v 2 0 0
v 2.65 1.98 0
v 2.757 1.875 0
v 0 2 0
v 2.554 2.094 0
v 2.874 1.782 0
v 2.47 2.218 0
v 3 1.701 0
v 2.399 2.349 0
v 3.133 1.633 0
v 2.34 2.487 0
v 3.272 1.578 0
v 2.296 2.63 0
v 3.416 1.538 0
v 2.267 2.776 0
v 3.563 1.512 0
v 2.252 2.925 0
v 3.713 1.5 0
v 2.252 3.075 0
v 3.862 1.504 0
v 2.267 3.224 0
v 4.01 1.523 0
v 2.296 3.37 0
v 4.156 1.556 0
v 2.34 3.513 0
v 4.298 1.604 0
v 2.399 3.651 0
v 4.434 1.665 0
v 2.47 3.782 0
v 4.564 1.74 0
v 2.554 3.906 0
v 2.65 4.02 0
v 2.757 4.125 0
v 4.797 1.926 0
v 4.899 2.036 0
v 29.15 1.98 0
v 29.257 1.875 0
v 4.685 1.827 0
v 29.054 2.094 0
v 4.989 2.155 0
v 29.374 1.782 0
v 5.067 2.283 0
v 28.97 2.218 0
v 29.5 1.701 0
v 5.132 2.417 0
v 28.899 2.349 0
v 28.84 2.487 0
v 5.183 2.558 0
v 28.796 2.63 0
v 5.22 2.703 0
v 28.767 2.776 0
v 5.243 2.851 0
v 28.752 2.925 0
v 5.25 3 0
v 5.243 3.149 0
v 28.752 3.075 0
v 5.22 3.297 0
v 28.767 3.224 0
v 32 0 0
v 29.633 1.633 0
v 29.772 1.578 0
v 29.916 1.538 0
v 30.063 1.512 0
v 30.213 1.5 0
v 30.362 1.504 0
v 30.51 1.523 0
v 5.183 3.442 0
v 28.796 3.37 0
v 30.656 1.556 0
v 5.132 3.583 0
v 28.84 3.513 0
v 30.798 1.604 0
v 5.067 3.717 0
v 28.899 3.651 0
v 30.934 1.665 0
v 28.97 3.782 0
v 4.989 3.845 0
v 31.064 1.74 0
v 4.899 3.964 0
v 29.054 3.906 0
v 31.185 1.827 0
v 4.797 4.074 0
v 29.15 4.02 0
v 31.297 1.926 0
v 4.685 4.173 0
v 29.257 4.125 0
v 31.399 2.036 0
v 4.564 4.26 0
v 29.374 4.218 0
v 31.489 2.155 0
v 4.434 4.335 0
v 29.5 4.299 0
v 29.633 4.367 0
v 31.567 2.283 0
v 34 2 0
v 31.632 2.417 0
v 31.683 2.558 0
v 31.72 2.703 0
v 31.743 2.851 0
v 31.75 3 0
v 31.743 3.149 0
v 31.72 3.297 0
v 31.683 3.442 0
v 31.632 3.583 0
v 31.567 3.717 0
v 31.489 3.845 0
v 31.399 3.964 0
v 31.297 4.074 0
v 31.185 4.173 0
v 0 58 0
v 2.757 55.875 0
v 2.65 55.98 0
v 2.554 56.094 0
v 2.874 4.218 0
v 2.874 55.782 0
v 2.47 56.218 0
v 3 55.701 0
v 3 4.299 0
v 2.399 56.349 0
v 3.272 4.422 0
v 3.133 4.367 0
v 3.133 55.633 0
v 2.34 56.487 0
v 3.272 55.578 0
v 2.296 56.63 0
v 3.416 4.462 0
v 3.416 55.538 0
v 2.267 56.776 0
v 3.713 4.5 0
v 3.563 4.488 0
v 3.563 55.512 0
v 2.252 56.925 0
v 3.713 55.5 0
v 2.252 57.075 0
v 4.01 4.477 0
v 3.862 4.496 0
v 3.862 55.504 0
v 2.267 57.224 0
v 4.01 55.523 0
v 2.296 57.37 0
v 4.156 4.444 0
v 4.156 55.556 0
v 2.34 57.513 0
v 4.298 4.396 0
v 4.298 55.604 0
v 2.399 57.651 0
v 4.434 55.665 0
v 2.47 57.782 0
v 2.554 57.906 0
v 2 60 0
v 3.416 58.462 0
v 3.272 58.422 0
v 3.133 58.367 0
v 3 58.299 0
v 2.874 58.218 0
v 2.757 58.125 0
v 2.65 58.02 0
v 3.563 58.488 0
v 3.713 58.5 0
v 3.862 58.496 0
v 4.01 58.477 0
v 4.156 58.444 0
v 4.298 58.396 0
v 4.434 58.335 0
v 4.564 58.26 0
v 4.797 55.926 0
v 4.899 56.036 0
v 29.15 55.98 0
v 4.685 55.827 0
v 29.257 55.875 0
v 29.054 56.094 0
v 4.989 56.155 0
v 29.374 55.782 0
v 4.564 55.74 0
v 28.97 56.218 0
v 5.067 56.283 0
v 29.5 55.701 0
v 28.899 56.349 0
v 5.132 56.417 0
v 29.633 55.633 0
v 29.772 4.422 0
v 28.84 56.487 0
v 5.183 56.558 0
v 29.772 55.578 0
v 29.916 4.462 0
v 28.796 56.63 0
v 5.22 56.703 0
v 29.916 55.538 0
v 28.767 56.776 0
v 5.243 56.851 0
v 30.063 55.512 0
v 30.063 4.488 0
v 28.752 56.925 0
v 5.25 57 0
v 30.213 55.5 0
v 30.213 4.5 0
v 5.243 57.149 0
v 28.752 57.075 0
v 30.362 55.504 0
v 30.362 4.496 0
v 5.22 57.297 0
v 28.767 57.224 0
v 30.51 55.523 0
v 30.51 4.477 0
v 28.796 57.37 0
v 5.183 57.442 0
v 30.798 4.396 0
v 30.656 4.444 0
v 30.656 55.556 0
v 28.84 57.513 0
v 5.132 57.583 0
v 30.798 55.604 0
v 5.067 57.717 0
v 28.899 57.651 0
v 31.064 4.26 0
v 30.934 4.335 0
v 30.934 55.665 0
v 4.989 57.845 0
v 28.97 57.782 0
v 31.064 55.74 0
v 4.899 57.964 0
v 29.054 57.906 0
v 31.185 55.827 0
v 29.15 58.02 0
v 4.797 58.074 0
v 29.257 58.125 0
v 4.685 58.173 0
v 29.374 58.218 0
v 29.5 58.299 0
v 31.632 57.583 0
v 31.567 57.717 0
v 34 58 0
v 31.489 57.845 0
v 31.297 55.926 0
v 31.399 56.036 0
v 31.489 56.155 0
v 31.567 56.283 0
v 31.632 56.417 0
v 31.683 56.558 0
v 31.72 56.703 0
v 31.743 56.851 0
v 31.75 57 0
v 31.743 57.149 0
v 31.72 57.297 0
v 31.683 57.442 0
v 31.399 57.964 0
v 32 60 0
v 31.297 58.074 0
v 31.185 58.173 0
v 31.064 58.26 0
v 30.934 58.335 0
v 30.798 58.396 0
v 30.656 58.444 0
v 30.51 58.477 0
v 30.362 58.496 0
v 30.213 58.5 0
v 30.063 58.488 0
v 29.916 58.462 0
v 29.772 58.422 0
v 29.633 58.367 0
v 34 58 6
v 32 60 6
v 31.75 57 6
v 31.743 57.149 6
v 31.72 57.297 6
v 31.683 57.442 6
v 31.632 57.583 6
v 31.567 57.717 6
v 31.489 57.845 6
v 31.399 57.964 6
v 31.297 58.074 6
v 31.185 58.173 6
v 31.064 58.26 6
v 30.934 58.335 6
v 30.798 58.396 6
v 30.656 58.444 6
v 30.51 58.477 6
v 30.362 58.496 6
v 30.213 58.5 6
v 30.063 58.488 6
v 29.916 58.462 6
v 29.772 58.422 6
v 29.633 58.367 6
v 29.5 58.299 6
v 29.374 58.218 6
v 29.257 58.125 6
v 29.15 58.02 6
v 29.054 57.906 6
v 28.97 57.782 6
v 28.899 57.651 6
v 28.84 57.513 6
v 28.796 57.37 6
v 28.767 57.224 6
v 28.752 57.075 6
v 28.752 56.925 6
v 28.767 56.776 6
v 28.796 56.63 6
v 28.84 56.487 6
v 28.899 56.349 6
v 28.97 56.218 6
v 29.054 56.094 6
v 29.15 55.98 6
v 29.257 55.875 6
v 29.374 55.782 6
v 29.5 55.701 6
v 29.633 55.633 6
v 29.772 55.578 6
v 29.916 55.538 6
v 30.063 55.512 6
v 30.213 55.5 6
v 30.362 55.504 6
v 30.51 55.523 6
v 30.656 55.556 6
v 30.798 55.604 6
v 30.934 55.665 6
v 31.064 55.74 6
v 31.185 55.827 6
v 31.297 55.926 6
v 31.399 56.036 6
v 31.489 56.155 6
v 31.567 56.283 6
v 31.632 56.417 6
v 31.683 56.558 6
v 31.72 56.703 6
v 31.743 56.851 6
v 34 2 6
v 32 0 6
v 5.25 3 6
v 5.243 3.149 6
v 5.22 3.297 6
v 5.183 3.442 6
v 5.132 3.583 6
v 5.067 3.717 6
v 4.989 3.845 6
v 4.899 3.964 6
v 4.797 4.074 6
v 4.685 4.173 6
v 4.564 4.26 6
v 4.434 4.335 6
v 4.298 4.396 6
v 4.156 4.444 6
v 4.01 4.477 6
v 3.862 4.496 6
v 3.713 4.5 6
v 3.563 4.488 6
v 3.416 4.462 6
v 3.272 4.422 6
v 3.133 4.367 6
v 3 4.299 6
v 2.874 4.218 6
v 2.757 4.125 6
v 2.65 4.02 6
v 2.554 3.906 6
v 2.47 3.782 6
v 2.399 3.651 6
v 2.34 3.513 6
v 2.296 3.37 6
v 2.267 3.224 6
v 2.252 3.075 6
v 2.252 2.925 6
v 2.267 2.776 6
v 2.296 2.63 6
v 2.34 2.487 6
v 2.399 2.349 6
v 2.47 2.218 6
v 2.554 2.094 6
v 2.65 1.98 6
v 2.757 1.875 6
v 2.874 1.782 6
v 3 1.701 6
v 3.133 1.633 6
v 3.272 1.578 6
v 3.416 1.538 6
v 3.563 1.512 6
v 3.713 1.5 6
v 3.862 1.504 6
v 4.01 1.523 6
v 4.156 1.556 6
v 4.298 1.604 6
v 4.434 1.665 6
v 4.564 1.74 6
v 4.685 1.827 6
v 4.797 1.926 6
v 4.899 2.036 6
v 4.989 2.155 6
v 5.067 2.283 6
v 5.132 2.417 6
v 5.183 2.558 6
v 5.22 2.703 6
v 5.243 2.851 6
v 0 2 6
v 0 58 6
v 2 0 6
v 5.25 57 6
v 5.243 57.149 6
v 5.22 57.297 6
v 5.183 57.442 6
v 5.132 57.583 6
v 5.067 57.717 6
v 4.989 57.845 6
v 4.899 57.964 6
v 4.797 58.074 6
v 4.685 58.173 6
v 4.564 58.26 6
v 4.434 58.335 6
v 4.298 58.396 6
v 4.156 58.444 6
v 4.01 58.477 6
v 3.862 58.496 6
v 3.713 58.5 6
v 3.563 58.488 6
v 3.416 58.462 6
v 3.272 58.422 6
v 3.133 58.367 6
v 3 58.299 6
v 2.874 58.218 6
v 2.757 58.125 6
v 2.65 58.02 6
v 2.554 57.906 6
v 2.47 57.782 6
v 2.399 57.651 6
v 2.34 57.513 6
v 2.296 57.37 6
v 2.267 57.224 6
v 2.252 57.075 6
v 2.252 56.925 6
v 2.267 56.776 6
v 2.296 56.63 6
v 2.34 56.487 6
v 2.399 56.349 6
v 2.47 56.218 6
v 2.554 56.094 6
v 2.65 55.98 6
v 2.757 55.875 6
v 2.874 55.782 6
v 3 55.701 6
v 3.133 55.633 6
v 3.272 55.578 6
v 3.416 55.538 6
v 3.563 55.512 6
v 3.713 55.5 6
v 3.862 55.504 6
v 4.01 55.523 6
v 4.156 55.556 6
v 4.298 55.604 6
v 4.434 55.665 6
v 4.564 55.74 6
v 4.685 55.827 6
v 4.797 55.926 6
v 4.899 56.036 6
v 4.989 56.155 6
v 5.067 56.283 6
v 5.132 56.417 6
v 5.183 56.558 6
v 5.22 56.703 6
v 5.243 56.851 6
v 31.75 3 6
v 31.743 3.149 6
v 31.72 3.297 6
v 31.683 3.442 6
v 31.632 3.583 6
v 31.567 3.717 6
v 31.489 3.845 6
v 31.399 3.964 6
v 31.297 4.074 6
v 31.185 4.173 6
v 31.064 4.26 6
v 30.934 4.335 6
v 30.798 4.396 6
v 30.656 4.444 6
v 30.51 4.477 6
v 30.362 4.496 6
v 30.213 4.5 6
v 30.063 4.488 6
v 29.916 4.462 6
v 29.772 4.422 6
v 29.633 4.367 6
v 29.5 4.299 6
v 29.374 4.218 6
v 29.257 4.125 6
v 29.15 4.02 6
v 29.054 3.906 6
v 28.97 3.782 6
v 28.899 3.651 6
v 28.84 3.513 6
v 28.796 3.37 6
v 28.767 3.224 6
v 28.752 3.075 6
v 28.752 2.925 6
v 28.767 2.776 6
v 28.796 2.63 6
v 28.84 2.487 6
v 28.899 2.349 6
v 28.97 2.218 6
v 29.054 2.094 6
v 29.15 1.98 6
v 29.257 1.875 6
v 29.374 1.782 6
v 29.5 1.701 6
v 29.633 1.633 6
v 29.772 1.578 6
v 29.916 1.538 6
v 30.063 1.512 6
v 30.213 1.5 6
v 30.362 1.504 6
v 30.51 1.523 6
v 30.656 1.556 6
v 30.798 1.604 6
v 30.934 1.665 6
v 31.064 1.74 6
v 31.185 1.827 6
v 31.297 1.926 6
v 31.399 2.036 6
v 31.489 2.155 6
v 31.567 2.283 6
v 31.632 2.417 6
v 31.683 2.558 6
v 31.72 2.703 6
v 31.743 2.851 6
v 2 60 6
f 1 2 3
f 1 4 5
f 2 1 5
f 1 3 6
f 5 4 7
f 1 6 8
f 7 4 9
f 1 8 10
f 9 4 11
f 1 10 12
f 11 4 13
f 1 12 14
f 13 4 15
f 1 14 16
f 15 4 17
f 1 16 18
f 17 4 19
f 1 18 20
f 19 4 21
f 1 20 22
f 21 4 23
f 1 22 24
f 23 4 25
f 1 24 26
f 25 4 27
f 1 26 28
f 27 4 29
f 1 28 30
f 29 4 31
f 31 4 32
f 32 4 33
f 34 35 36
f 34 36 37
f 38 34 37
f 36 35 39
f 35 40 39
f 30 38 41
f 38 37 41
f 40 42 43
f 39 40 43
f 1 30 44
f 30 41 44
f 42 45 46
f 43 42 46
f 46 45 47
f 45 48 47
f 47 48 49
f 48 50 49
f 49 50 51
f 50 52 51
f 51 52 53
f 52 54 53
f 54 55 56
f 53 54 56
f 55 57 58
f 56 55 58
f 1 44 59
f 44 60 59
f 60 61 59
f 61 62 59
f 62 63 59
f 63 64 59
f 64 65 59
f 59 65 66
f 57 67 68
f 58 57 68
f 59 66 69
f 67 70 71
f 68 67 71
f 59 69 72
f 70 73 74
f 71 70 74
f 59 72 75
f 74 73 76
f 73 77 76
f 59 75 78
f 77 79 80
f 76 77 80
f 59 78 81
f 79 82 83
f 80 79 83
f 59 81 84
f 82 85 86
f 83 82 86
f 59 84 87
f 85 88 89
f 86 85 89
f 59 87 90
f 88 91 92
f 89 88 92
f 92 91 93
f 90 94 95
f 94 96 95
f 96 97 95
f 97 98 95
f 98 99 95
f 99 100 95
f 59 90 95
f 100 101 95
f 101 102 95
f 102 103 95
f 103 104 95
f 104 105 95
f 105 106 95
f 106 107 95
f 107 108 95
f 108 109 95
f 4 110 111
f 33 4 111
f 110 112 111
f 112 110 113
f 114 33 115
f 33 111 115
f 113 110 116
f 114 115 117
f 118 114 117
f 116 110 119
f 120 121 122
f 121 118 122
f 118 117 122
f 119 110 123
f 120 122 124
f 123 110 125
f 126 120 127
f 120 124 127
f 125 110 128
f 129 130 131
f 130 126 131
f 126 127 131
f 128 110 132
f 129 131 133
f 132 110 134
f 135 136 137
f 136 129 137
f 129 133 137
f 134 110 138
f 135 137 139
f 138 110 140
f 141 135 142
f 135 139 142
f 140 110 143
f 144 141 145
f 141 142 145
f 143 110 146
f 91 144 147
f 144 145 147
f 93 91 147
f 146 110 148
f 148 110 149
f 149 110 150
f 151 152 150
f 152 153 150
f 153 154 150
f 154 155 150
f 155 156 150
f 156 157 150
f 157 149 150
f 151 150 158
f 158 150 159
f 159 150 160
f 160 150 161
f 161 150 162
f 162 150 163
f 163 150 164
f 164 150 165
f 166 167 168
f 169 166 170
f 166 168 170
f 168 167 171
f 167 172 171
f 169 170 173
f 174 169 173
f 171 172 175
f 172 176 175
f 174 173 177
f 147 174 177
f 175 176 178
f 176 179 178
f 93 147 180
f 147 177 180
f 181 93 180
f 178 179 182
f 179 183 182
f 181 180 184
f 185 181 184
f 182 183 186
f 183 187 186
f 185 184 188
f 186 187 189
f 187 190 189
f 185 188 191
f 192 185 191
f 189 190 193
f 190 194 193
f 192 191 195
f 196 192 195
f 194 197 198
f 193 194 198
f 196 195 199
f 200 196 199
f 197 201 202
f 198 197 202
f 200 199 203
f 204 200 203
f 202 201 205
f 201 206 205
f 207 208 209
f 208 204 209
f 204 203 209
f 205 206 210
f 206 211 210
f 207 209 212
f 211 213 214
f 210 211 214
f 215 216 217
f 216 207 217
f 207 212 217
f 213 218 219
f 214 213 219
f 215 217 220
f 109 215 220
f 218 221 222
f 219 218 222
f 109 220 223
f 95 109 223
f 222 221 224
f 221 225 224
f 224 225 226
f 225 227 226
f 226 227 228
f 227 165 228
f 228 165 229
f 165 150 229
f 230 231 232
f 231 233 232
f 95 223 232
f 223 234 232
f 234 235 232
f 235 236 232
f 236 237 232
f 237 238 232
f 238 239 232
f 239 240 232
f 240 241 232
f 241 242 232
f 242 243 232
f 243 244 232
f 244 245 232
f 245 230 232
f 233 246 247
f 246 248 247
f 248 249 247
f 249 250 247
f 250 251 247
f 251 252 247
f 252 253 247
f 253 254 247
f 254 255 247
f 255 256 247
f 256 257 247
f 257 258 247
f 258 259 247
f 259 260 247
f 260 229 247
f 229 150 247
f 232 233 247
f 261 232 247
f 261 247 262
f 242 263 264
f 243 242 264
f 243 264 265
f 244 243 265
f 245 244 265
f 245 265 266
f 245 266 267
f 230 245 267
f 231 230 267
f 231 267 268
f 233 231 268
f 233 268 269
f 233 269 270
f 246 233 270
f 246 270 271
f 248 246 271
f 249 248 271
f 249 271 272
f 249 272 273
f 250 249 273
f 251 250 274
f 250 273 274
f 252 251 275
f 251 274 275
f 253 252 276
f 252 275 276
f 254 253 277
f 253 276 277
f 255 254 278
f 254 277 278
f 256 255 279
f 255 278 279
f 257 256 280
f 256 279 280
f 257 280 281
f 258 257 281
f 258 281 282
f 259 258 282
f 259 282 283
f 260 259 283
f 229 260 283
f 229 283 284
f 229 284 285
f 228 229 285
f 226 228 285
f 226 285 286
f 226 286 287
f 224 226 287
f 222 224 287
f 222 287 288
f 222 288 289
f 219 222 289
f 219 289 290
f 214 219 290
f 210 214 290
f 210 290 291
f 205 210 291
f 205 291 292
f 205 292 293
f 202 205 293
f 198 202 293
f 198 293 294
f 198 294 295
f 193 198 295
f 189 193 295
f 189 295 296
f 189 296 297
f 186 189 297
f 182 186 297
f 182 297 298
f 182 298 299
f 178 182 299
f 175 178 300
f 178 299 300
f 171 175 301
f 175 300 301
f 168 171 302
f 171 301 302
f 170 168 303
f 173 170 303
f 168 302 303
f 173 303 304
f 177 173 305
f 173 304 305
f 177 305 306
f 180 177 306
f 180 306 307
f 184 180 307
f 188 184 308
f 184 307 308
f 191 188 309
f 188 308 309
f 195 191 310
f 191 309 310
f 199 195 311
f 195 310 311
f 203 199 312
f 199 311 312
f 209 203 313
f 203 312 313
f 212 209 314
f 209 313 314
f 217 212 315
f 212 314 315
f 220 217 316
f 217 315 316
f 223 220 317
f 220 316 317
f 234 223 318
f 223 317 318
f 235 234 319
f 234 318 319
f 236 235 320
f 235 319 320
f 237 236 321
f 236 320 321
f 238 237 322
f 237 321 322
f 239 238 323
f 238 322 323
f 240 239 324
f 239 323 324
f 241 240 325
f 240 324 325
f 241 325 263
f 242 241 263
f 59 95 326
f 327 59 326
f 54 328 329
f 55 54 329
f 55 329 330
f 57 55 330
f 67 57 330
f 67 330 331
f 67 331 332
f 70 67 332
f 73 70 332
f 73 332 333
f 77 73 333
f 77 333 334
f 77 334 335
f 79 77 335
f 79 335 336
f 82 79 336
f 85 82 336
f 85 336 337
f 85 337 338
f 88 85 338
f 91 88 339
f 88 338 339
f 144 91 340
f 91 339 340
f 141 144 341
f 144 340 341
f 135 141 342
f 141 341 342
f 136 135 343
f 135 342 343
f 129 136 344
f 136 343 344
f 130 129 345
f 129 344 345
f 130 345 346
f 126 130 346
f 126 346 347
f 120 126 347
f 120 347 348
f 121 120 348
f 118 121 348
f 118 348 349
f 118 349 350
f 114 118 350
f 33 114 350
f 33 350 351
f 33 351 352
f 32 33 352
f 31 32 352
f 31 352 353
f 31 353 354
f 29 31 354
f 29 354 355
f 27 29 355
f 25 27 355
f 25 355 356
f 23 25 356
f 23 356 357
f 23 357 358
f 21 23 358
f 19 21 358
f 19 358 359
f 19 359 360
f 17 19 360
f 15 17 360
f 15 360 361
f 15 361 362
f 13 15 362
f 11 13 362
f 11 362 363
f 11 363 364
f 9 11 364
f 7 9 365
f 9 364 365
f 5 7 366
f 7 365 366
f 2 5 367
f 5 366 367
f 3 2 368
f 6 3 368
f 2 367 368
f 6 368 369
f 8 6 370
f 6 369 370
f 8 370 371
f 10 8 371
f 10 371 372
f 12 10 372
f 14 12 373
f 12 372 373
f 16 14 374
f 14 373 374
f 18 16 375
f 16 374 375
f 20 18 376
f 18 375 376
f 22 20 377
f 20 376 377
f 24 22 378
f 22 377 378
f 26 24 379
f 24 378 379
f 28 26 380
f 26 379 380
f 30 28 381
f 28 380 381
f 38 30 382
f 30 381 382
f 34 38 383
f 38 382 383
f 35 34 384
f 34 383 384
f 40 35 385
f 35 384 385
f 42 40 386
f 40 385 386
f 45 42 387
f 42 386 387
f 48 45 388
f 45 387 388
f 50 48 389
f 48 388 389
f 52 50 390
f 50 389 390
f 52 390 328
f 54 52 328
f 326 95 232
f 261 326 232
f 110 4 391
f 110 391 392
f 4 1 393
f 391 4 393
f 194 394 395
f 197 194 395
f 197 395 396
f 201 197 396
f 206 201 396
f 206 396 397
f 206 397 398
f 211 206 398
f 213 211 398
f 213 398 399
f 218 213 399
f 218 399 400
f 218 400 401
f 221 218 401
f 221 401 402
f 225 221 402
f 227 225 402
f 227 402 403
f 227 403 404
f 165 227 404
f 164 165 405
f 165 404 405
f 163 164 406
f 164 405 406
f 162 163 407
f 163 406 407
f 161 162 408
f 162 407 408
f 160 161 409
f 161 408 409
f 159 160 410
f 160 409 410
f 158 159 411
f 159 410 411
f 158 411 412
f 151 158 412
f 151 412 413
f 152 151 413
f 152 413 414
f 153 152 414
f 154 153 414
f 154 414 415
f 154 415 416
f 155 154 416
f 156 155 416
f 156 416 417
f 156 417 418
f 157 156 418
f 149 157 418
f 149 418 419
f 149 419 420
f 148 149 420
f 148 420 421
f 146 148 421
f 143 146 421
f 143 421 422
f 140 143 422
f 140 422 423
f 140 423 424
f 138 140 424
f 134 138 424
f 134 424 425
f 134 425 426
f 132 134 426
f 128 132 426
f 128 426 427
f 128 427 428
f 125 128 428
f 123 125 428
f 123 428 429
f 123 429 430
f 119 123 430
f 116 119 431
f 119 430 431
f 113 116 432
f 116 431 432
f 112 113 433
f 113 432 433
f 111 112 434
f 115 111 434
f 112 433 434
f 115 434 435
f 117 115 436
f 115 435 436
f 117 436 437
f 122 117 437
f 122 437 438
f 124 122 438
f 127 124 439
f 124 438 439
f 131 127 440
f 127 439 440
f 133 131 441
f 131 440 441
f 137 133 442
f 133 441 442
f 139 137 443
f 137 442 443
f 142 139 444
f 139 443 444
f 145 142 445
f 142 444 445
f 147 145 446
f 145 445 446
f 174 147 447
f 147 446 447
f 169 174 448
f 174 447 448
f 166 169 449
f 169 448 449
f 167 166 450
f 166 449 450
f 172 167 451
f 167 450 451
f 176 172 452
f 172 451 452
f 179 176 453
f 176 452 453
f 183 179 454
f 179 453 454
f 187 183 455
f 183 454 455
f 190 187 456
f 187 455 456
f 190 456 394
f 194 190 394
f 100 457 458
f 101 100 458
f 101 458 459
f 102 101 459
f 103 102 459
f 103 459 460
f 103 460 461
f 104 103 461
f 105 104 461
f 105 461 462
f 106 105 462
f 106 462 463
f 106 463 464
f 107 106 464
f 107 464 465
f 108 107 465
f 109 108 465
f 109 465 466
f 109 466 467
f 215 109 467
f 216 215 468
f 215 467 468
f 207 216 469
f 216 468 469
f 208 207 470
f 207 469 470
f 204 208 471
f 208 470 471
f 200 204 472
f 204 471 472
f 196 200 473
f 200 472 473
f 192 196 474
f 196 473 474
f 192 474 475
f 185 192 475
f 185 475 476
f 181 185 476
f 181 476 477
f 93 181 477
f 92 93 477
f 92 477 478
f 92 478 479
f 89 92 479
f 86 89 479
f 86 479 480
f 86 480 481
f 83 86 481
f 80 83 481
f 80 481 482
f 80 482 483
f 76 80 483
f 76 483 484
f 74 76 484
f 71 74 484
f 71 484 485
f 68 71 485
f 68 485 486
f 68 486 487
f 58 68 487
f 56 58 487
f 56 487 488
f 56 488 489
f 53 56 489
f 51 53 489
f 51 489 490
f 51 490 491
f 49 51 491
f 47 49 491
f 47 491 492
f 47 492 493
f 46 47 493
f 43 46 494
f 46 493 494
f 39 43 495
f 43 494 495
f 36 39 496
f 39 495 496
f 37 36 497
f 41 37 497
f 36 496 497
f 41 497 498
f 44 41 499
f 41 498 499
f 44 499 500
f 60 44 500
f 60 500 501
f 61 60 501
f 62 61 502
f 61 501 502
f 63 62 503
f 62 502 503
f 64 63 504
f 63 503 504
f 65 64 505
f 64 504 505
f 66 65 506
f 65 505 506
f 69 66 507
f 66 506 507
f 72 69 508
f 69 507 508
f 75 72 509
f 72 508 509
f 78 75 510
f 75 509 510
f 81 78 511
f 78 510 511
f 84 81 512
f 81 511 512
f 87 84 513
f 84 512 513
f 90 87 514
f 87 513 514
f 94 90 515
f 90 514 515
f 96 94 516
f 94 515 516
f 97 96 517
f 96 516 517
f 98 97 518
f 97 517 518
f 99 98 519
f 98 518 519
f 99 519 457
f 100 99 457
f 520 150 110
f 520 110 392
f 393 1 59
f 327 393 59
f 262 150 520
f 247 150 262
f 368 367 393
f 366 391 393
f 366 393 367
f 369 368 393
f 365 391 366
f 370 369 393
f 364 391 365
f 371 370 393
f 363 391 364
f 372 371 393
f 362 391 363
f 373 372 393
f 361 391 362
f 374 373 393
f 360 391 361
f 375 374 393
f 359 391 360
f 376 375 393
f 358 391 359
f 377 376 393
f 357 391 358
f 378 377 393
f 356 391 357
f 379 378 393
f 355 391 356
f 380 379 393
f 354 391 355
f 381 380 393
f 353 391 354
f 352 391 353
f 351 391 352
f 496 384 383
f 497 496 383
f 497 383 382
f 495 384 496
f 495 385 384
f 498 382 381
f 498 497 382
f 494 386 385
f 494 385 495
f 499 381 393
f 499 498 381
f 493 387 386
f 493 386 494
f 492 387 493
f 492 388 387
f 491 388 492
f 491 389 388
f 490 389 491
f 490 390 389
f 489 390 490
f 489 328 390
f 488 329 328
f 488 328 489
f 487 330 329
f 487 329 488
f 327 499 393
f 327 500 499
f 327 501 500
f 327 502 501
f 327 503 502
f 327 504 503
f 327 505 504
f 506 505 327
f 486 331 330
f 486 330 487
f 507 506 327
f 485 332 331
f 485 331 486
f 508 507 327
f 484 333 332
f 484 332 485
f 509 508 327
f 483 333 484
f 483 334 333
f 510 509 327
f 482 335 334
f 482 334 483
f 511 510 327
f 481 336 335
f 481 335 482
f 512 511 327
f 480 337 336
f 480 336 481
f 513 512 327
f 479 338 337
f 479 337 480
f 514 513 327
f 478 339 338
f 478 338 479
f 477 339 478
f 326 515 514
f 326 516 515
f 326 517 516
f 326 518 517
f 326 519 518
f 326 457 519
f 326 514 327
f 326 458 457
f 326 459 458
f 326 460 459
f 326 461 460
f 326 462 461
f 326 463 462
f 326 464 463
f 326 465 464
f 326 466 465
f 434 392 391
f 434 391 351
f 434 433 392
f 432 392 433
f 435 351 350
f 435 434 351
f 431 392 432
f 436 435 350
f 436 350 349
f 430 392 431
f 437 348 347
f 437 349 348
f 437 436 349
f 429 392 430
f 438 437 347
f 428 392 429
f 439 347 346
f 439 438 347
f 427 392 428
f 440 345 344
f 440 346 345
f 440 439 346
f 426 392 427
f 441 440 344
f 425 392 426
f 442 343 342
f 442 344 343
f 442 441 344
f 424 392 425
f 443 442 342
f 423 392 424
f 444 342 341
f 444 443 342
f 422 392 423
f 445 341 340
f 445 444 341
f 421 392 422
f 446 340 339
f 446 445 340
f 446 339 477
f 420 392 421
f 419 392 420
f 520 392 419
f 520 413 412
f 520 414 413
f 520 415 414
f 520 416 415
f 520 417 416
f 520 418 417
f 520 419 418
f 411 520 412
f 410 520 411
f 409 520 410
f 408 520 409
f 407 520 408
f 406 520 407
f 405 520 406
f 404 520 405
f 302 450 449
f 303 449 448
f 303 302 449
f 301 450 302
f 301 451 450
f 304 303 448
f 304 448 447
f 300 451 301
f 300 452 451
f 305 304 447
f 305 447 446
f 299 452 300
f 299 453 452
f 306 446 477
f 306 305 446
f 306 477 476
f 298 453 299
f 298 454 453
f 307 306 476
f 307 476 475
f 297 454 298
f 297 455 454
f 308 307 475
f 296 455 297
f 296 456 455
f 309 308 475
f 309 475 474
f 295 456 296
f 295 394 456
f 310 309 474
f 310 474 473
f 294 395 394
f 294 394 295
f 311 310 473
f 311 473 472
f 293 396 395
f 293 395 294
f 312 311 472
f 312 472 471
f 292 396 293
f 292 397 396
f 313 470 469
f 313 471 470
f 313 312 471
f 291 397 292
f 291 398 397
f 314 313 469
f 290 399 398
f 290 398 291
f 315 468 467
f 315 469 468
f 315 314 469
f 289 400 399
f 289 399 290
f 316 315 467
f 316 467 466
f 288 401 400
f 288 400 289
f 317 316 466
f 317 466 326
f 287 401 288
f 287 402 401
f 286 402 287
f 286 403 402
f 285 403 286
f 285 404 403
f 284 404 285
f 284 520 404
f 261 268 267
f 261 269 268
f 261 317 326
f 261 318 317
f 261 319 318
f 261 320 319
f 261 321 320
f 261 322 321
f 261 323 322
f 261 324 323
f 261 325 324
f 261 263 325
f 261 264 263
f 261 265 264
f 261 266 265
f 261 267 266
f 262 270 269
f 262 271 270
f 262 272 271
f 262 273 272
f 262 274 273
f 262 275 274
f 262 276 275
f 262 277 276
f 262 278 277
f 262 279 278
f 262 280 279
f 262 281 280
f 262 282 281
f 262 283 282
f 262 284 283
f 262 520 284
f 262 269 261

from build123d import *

# Parameters (mm, degrees)
SKETCH2_W           = 34
SKETCH2_H           = 60
BOSS_EXTRUDE1_DEPTH = 6
SKETCH3_R           = 1.5
CUT_EXTRUDE1_DEPTH  = 70.2242732
CHAMFER1_SIZE       = 2


with BuildPart() as part:
    # Sketch2 → Boss-Extrude1 (new body)
    with BuildSketch(Plane.XY):
        with Locations((17, 30)):
            Rectangle(SKETCH2_W, SKETCH2_H)
    extrude(amount=BOSS_EXTRUDE1_DEPTH)

    # Sketch3 → Cut-Extrude1 (cut, through all)
    with BuildSketch(Plane.XY.offset(6)):
        with Locations((3.75, 57)):
            Circle(SKETCH3_R)
        with Locations((30.25, 57)):
            Circle(SKETCH3_R)
        with Locations((3.75, 3)):
            Circle(SKETCH3_R)
        with Locations((30.25, 3)):
            Circle(SKETCH3_R)
    extrude(amount=-CUT_EXTRUDE1_DEPTH, mode=Mode.SUBTRACT)

    # Chamfer1
    chamfer1_edges = [part.edges().sort_by_distance(p)[0] for p in [
        (0, 60, 3),
        (34, 60, 3),
        (34, 0, 3),
        (0, 0, 3),
    ]]
    chamfer(chamfer1_edges, length=CHAMFER1_SIZE)


solid = part.part
